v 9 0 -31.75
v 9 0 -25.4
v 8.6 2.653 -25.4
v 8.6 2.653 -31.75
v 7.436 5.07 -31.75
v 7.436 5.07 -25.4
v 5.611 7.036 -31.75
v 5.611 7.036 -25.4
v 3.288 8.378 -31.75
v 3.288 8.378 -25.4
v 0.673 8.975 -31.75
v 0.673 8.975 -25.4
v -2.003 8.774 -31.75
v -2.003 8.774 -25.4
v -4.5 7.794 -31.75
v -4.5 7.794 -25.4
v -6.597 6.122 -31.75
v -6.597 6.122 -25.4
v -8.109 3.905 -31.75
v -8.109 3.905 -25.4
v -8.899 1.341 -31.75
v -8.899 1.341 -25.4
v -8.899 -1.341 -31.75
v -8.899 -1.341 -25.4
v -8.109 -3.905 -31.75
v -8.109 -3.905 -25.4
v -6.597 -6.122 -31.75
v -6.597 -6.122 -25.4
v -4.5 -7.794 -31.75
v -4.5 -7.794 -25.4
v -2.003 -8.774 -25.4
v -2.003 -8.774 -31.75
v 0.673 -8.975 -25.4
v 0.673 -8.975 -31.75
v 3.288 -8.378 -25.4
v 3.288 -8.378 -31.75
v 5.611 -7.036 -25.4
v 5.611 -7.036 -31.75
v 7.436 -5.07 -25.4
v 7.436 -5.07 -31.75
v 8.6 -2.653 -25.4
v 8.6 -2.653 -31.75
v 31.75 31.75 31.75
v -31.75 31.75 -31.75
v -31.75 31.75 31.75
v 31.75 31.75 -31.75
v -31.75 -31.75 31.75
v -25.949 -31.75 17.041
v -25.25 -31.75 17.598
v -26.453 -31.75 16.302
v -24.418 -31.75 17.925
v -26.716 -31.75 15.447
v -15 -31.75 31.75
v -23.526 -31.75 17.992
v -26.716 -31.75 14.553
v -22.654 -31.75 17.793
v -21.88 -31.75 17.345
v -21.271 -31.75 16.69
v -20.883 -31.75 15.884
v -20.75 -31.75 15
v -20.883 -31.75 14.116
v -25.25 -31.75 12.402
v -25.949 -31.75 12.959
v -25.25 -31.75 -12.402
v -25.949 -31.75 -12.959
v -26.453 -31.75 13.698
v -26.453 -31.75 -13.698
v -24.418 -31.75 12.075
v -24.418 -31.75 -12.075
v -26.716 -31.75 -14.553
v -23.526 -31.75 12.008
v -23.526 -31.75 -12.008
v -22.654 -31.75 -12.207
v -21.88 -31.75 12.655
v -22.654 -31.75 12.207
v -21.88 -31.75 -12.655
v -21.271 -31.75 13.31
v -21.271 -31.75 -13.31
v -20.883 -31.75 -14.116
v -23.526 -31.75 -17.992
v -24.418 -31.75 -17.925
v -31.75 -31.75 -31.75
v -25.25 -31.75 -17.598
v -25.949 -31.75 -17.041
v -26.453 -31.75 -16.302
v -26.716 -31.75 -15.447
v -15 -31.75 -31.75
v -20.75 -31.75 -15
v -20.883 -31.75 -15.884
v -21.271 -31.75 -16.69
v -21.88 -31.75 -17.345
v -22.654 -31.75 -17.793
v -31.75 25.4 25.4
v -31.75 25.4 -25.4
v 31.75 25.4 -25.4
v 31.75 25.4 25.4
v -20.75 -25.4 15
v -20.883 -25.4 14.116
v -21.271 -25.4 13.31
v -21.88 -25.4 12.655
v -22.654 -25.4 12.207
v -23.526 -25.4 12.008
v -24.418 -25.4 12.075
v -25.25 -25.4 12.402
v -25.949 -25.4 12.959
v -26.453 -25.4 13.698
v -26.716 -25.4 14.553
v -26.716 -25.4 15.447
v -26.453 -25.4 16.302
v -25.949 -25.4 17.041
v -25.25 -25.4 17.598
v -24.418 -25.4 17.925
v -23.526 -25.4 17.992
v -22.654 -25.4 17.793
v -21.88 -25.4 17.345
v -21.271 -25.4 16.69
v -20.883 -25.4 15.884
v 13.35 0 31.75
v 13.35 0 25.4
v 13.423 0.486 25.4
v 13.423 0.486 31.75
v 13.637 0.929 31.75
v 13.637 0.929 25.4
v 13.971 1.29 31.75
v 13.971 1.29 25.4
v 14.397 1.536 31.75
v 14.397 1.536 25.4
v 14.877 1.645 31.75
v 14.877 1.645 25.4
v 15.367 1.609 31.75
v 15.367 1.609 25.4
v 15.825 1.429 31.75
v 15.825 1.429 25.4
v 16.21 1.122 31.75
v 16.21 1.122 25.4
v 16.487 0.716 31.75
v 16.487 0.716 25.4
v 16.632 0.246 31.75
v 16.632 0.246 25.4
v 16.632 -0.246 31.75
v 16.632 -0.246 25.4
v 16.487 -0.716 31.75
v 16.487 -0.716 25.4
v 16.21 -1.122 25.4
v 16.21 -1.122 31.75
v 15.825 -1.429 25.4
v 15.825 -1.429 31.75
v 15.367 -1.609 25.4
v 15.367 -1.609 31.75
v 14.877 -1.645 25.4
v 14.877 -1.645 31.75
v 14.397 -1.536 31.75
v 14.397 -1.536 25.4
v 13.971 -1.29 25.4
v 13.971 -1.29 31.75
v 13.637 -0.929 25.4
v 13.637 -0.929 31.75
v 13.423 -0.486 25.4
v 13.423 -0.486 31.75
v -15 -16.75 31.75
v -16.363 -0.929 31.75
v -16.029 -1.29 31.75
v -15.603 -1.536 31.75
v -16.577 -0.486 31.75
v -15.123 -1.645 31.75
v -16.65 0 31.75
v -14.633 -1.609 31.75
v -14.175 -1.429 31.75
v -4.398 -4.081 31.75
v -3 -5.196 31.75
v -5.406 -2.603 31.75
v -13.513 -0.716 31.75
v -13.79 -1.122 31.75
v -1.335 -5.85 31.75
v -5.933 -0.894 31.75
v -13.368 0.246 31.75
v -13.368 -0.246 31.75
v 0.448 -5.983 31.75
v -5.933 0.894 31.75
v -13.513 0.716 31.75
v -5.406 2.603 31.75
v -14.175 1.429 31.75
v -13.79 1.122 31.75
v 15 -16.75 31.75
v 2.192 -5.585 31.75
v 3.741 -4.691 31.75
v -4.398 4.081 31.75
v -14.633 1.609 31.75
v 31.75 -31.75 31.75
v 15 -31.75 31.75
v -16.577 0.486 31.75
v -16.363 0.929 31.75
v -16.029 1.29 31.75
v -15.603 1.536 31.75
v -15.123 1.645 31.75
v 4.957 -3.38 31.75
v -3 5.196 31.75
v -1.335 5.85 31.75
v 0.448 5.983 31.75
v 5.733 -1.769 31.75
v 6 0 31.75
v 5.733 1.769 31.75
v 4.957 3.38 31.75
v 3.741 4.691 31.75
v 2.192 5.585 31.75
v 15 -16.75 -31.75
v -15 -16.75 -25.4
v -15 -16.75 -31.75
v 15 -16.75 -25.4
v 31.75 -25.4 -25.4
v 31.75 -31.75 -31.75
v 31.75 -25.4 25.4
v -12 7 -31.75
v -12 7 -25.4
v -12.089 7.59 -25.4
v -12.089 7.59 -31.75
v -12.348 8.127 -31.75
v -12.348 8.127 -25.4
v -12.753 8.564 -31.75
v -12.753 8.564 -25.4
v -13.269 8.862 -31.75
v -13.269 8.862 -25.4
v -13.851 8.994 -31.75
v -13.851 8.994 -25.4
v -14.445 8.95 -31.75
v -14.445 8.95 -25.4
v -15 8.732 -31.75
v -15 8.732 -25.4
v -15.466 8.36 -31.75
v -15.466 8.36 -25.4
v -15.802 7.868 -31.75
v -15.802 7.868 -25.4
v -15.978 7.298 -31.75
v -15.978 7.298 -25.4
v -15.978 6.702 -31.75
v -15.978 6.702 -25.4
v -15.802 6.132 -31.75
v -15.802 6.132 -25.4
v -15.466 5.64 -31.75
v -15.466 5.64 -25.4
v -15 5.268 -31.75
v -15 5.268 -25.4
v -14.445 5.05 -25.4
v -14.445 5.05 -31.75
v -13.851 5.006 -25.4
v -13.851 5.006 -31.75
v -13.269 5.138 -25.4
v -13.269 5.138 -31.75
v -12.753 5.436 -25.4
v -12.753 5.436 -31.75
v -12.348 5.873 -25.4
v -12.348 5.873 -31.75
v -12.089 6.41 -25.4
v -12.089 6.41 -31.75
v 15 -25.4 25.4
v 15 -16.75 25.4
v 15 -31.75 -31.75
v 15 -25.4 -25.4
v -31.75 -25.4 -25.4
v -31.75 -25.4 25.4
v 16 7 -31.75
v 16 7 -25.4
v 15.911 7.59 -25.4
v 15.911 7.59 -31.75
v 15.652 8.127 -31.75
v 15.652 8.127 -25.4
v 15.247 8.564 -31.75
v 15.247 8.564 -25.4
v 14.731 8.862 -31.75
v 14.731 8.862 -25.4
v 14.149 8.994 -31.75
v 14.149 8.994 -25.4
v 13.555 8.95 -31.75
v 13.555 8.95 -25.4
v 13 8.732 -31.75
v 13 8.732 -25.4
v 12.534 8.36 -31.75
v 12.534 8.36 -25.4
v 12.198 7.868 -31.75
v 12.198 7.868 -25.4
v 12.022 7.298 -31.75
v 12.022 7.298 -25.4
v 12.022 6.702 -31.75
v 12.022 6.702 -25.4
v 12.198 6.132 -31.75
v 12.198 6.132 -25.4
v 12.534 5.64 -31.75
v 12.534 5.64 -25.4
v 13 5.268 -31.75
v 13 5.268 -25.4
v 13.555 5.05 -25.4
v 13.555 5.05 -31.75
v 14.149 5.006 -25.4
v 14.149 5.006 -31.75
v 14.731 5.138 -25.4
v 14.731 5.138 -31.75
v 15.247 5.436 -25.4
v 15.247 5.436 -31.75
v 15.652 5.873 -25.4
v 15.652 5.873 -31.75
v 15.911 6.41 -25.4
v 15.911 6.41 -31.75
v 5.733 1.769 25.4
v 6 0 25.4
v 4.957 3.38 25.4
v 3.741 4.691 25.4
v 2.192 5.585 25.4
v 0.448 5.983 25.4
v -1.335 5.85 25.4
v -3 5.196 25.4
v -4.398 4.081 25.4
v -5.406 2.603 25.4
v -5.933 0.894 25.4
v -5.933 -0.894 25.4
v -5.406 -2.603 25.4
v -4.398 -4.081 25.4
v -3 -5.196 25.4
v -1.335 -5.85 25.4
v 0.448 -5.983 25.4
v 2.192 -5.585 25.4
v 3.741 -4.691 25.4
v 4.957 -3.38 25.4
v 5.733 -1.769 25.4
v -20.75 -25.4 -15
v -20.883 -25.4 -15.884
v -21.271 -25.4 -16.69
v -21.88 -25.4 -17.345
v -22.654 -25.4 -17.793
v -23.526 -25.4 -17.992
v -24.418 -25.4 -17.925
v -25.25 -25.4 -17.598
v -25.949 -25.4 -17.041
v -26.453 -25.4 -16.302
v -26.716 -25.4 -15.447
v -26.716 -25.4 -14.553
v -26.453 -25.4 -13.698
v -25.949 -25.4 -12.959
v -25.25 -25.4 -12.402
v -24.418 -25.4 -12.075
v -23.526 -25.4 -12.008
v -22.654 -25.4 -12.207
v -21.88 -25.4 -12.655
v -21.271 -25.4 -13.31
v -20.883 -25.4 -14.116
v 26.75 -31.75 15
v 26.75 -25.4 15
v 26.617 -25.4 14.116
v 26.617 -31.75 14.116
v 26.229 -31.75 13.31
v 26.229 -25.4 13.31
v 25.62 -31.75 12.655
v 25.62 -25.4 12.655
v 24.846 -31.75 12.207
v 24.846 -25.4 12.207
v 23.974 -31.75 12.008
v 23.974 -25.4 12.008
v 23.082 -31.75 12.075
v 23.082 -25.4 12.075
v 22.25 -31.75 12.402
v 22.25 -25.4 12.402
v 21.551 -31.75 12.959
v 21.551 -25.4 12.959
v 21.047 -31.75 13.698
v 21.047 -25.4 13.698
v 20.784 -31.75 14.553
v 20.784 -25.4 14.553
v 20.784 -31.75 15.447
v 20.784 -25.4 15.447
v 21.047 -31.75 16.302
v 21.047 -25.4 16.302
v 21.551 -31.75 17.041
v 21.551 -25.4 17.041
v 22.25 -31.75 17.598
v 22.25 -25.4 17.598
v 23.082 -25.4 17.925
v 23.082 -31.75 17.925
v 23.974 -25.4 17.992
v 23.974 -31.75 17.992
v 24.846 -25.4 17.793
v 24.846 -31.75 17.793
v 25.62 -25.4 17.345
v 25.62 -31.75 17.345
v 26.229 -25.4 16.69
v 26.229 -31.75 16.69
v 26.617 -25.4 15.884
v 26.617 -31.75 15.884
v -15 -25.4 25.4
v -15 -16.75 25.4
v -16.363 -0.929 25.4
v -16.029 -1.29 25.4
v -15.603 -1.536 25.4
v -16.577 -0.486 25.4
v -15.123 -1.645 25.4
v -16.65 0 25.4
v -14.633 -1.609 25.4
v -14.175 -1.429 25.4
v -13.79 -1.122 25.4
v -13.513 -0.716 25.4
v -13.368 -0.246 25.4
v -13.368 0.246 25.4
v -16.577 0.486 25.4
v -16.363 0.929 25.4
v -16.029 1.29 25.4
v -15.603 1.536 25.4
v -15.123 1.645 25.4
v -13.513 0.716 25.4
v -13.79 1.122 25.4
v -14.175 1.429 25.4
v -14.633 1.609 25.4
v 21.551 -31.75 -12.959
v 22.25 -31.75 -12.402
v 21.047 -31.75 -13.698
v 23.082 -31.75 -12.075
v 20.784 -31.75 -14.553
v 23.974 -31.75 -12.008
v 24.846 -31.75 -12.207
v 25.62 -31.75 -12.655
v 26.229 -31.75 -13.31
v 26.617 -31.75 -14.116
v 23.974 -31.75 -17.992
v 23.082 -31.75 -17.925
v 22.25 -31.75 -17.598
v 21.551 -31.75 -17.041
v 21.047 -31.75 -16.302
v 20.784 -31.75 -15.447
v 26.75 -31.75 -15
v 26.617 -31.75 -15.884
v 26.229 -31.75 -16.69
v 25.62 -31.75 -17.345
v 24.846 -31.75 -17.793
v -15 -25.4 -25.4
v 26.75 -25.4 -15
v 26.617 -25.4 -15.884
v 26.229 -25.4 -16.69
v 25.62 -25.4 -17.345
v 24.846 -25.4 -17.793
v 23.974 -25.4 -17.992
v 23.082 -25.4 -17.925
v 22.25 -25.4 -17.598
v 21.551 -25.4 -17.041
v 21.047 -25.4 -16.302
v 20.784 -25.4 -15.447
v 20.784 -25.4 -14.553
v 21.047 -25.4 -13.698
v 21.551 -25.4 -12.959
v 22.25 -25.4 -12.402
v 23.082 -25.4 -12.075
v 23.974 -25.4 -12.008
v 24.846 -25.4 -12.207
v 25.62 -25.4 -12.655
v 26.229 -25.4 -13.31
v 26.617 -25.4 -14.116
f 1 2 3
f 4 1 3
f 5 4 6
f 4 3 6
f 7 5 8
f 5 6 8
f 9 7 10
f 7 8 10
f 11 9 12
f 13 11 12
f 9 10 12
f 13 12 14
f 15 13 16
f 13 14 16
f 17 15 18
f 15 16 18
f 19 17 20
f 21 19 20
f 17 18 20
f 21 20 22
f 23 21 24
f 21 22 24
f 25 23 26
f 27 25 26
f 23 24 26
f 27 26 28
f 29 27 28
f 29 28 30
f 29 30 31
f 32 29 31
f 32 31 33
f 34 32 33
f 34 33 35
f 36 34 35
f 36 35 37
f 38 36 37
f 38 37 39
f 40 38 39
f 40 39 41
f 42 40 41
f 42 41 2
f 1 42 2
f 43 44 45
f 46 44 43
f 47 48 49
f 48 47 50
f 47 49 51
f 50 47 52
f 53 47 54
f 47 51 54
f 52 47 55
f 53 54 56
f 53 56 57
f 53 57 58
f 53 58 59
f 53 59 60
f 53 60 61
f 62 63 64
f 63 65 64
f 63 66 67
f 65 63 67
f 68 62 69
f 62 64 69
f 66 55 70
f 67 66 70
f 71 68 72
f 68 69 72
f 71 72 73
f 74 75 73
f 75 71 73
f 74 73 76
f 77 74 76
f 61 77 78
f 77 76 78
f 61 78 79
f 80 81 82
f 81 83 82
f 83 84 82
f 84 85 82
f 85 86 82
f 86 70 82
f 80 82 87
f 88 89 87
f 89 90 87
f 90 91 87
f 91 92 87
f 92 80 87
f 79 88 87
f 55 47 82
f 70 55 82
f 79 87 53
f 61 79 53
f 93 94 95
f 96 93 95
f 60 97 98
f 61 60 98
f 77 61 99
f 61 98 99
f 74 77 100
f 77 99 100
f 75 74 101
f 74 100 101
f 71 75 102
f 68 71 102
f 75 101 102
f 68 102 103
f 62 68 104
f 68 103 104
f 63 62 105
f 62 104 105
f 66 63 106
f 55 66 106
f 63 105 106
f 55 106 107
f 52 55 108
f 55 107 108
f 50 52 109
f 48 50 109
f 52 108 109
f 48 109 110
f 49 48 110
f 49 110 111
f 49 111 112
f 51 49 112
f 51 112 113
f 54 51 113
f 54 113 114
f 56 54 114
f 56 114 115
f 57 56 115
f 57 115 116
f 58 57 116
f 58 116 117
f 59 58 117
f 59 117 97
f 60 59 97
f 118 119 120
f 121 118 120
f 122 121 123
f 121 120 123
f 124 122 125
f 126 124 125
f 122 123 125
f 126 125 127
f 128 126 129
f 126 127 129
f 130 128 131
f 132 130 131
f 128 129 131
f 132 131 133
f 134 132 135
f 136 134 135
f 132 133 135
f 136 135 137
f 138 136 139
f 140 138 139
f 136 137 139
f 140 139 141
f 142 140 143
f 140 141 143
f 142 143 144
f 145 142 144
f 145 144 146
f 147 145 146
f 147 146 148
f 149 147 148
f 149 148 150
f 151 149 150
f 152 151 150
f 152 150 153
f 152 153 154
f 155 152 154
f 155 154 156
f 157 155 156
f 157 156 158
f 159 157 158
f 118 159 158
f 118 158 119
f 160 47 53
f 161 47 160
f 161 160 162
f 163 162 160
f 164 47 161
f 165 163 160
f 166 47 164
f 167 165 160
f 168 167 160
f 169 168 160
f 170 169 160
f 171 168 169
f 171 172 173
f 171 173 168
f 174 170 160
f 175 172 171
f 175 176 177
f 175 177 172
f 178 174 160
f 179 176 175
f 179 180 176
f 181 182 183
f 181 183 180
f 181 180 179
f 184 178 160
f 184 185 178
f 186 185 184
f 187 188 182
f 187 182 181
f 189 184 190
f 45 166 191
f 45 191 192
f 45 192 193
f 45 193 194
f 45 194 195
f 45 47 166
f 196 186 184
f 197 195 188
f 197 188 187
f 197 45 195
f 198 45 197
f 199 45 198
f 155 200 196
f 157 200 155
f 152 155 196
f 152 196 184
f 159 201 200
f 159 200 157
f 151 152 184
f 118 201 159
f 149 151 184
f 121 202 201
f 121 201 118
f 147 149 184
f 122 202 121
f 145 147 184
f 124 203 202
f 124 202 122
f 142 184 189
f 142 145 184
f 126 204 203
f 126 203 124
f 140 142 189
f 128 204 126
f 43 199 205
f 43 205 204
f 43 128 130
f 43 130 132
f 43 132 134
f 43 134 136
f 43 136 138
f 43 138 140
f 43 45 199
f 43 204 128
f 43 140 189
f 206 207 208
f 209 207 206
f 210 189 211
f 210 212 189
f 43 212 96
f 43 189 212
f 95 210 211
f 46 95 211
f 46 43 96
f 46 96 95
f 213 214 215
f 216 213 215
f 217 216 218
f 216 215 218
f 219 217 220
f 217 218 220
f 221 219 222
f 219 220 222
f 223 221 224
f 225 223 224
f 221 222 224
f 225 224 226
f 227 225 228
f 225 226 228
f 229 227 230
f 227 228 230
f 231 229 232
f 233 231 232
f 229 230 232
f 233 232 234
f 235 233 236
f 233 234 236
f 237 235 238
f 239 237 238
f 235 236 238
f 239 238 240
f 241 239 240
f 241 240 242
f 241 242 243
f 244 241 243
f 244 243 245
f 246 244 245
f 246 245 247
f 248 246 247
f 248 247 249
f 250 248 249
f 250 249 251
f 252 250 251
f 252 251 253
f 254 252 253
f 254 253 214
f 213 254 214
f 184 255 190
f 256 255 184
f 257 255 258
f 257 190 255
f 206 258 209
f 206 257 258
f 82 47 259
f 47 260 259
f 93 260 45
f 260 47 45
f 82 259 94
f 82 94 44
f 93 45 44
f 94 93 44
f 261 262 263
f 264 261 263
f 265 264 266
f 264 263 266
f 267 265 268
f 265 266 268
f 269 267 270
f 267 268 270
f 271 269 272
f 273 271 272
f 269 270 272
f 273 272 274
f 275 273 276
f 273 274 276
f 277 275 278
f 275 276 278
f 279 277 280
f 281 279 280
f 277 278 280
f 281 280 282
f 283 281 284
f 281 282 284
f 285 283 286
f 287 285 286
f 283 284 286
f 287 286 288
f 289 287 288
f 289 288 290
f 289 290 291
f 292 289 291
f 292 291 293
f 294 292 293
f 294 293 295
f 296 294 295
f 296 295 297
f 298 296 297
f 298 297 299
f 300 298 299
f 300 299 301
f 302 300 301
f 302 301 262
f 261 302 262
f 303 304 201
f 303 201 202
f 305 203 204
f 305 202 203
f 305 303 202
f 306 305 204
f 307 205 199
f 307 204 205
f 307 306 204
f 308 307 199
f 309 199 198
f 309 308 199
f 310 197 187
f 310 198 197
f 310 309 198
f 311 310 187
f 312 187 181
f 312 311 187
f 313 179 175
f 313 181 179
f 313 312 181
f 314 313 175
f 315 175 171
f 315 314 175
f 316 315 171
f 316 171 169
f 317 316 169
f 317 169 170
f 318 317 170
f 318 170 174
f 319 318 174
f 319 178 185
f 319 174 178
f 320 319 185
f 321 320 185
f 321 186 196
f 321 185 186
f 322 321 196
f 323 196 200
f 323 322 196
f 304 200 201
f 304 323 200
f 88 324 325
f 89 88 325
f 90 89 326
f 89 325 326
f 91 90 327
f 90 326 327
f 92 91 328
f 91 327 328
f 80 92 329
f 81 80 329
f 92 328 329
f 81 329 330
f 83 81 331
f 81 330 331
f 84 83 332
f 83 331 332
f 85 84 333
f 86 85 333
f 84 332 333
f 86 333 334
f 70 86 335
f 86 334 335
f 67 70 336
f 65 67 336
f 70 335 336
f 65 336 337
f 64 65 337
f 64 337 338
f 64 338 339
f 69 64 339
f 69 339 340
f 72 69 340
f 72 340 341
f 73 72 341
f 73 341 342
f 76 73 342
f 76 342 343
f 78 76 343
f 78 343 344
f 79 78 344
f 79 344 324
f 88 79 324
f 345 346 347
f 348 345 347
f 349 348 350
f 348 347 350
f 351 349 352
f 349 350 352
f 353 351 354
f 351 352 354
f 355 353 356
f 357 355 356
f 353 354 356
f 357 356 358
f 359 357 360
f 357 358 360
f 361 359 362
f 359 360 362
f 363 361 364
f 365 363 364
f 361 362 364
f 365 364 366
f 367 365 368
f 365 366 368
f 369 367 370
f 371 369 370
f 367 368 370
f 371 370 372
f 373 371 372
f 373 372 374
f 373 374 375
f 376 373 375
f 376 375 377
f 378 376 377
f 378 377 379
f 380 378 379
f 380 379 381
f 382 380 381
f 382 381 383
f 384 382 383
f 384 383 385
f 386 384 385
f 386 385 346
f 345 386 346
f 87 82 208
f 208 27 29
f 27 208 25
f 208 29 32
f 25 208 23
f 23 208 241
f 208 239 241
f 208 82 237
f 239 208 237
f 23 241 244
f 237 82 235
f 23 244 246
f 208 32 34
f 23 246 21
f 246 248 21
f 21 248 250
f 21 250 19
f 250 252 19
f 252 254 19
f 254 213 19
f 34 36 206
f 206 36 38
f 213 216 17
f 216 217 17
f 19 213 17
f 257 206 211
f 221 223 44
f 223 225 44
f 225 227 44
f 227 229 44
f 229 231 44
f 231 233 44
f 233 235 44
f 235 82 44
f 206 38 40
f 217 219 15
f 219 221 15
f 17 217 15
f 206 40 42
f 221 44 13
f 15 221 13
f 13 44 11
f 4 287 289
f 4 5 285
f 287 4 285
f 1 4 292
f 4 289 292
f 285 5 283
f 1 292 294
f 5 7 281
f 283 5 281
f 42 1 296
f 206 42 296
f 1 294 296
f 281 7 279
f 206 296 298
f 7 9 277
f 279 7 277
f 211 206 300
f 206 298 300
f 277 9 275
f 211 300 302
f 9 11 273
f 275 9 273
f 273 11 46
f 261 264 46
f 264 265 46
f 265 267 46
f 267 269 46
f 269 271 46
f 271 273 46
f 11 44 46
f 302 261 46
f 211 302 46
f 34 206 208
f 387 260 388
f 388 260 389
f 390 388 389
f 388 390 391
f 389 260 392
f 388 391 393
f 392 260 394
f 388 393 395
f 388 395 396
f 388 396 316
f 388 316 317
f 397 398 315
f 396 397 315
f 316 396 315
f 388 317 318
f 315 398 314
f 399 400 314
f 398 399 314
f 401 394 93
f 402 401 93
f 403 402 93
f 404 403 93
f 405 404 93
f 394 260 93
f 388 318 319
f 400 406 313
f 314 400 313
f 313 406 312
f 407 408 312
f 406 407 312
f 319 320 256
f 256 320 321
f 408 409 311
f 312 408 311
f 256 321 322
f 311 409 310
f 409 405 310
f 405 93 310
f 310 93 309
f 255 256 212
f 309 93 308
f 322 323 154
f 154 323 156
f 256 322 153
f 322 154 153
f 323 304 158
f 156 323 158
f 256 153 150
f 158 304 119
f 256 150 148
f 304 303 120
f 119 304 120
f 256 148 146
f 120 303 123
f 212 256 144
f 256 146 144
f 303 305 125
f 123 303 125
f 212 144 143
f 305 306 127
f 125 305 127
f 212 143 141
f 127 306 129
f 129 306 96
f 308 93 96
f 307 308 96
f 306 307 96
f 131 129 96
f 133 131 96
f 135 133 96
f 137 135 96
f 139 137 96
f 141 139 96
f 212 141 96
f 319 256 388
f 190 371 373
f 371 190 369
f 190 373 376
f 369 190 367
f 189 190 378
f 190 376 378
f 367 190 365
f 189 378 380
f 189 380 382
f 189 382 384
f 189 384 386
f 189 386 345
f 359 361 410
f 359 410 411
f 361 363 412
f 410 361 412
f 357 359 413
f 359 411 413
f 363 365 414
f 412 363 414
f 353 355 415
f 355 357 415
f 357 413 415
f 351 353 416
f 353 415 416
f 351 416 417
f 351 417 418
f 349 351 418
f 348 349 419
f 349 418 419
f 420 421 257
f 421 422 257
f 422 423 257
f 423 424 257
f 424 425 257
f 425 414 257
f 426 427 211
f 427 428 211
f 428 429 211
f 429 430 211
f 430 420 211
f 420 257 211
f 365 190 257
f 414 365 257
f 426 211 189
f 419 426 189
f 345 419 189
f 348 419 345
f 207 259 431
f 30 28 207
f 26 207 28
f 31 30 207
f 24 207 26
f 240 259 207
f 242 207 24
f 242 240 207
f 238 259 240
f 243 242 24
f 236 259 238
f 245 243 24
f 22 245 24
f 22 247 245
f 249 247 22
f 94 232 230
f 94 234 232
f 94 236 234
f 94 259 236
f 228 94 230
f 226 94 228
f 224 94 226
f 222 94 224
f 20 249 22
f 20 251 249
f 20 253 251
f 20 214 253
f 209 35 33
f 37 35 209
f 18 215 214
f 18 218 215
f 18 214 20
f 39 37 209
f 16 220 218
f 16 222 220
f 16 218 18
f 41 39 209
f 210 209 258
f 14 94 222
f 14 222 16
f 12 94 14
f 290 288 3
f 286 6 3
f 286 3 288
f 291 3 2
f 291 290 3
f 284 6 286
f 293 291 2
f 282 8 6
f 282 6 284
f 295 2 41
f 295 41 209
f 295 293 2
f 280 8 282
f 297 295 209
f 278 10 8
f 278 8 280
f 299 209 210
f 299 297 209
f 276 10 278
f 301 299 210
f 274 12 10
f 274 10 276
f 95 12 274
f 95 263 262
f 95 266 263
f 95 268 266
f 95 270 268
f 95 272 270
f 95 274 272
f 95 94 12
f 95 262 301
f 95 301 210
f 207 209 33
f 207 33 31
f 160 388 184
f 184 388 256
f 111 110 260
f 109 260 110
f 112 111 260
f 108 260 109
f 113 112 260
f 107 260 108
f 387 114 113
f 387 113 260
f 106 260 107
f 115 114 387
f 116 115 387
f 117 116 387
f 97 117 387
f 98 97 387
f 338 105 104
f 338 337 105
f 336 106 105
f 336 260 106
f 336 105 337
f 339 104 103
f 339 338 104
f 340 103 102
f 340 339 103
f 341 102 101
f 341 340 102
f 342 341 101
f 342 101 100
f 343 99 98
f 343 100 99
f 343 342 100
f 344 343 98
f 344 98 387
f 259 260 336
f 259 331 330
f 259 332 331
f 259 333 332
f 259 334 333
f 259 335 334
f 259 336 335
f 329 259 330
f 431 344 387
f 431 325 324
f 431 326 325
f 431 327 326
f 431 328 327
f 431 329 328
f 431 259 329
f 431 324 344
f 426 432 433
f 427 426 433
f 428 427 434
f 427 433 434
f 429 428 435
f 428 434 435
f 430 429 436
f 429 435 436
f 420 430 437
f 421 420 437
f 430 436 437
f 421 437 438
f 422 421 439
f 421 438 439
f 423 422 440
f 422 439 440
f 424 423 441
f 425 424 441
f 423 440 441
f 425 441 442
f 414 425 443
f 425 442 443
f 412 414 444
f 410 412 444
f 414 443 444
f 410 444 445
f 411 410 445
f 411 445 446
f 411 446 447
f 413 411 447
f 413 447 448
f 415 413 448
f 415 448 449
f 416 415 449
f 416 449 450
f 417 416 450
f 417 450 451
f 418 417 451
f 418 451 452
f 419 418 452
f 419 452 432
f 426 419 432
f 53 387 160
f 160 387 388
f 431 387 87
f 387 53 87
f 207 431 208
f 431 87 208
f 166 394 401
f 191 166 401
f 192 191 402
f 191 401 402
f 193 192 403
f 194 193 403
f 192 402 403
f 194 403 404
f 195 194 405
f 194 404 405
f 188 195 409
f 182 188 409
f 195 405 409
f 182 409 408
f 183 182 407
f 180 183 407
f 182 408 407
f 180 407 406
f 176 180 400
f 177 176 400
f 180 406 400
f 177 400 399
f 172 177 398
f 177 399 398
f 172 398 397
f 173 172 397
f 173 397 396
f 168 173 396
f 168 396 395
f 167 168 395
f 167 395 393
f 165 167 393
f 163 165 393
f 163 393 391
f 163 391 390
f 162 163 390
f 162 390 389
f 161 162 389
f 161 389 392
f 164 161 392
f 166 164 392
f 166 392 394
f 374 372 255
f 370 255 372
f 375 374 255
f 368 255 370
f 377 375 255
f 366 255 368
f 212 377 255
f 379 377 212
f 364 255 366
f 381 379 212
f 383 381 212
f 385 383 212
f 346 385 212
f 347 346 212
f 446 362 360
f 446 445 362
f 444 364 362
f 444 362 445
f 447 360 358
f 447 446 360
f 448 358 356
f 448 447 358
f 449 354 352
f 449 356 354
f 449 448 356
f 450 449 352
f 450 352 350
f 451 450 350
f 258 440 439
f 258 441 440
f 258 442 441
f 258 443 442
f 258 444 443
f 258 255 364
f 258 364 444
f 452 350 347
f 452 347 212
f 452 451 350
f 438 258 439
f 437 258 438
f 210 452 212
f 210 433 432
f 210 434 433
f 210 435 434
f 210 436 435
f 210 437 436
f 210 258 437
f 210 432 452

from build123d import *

# Parameters (mm, degrees)
SKETCH1_W                 = 63.5
SKETCH1_H                 = 63.5
BOSS_EXTRUDE1_DEPTH       = 31.75
SHELL1_T                  = -6.35
SKETCH2_W                 = 30
SKETCH2_H                 = 15
CUT_EXTRUDE1_DEPTH        = 32.75
CUT_EXTRUDE1_DEPTH_BACK   = 32.75
SKETCH3_R                 = 6
CUT_EXTRUDE2_DEPTH        = 32.75
M4X0_7_TAPPED_HOLE3_D     = 3.3
M4X0_7_TAPPED_HOLE3_DEPTH = 6.35
SKETCH8_R                 = 9
SKETCH8_R_2               = 2
CUT_EXTRUDE3_DEPTH        = 32.75
SKETCH9_R                 = 3
CUT_EXTRUDE4_DEPTH        = 32.75


with BuildPart() as part:
    # Sketch1 → Boss-Extrude1 (new body, symmetric)
    with BuildSketch(Plane(origin=(0, 0, 0), x_dir=(1, 0, 0), z_dir=(0, 1, 0))):
        Rectangle(SKETCH1_W, SKETCH1_H)
    extrude(amount=BOSS_EXTRUDE1_DEPTH, both=True)

    # Shell1
    shell1_openings = [part.faces().sort_by_distance(p)[0] for p in [
        (-31.75, 0, 0),
        (31.75, 0, 0),
    ]]
    offset(amount=SHELL1_T, openings=shell1_openings, kind=Kind.INTERSECTION)

    # Sketch2 → Cut-Extrude1 (cut, two sides)
    with BuildSketch(Plane.XY) as cut_extrude1_sk:
        with Locations((0, -24.25)):
            Rectangle(SKETCH2_W, SKETCH2_H)
    extrude(amount=CUT_EXTRUDE1_DEPTH, mode=Mode.SUBTRACT)
    extrude(cut_extrude1_sk.sketch, amount=-CUT_EXTRUDE1_DEPTH_BACK, mode=Mode.SUBTRACT)

    # Sketch3 → Cut-Extrude2 (cut, through all)
    with BuildSketch(Plane.XY):
        Circle(SKETCH3_R)
    extrude(amount=CUT_EXTRUDE2_DEPTH, mode=Mode.SUBTRACT)

    # M4x0.7 Tapped Hole3
    with Locations(Plane(origin=(-15, 0, 31.75), x_dir=(1, 0, 0), z_dir=(0, 0, 1))):
        with Locations((0, 0), (30, 0)):
            Hole(M4X0_7_TAPPED_HOLE3_D / 2, depth=M4X0_7_TAPPED_HOLE3_DEPTH)

    # Sketch8 → Cut-Extrude3 (cut, through all)
    with BuildSketch(Plane.XY):
        Circle(SKETCH8_R)
        with Locations((-14, 7)):
            Circle(SKETCH8_R_2)
        with Locations((14, 7)):
            Circle(SKETCH8_R_2)
    extrude(amount=-CUT_EXTRUDE3_DEPTH, mode=Mode.SUBTRACT)

    # Sketch9 → Cut-Extrude4 (cut, through all)
    with BuildSketch(Plane(origin=(0, 0, 0), x_dir=(1, 0, 0), z_dir=(0, 1, 0))):
        with Locations((-23.75, -15)):
            Circle(SKETCH9_R)
        with Locations((23.75, -15)):
            Circle(SKETCH9_R)
        with Locations((23.75, 15)):
            Circle(SKETCH9_R)
        with Locations((-23.75, 15)):
            Circle(SKETCH9_R)
    extrude(amount=-CUT_EXTRUDE4_DEPTH, mode=Mode.SUBTRACT)


solid = part.part
